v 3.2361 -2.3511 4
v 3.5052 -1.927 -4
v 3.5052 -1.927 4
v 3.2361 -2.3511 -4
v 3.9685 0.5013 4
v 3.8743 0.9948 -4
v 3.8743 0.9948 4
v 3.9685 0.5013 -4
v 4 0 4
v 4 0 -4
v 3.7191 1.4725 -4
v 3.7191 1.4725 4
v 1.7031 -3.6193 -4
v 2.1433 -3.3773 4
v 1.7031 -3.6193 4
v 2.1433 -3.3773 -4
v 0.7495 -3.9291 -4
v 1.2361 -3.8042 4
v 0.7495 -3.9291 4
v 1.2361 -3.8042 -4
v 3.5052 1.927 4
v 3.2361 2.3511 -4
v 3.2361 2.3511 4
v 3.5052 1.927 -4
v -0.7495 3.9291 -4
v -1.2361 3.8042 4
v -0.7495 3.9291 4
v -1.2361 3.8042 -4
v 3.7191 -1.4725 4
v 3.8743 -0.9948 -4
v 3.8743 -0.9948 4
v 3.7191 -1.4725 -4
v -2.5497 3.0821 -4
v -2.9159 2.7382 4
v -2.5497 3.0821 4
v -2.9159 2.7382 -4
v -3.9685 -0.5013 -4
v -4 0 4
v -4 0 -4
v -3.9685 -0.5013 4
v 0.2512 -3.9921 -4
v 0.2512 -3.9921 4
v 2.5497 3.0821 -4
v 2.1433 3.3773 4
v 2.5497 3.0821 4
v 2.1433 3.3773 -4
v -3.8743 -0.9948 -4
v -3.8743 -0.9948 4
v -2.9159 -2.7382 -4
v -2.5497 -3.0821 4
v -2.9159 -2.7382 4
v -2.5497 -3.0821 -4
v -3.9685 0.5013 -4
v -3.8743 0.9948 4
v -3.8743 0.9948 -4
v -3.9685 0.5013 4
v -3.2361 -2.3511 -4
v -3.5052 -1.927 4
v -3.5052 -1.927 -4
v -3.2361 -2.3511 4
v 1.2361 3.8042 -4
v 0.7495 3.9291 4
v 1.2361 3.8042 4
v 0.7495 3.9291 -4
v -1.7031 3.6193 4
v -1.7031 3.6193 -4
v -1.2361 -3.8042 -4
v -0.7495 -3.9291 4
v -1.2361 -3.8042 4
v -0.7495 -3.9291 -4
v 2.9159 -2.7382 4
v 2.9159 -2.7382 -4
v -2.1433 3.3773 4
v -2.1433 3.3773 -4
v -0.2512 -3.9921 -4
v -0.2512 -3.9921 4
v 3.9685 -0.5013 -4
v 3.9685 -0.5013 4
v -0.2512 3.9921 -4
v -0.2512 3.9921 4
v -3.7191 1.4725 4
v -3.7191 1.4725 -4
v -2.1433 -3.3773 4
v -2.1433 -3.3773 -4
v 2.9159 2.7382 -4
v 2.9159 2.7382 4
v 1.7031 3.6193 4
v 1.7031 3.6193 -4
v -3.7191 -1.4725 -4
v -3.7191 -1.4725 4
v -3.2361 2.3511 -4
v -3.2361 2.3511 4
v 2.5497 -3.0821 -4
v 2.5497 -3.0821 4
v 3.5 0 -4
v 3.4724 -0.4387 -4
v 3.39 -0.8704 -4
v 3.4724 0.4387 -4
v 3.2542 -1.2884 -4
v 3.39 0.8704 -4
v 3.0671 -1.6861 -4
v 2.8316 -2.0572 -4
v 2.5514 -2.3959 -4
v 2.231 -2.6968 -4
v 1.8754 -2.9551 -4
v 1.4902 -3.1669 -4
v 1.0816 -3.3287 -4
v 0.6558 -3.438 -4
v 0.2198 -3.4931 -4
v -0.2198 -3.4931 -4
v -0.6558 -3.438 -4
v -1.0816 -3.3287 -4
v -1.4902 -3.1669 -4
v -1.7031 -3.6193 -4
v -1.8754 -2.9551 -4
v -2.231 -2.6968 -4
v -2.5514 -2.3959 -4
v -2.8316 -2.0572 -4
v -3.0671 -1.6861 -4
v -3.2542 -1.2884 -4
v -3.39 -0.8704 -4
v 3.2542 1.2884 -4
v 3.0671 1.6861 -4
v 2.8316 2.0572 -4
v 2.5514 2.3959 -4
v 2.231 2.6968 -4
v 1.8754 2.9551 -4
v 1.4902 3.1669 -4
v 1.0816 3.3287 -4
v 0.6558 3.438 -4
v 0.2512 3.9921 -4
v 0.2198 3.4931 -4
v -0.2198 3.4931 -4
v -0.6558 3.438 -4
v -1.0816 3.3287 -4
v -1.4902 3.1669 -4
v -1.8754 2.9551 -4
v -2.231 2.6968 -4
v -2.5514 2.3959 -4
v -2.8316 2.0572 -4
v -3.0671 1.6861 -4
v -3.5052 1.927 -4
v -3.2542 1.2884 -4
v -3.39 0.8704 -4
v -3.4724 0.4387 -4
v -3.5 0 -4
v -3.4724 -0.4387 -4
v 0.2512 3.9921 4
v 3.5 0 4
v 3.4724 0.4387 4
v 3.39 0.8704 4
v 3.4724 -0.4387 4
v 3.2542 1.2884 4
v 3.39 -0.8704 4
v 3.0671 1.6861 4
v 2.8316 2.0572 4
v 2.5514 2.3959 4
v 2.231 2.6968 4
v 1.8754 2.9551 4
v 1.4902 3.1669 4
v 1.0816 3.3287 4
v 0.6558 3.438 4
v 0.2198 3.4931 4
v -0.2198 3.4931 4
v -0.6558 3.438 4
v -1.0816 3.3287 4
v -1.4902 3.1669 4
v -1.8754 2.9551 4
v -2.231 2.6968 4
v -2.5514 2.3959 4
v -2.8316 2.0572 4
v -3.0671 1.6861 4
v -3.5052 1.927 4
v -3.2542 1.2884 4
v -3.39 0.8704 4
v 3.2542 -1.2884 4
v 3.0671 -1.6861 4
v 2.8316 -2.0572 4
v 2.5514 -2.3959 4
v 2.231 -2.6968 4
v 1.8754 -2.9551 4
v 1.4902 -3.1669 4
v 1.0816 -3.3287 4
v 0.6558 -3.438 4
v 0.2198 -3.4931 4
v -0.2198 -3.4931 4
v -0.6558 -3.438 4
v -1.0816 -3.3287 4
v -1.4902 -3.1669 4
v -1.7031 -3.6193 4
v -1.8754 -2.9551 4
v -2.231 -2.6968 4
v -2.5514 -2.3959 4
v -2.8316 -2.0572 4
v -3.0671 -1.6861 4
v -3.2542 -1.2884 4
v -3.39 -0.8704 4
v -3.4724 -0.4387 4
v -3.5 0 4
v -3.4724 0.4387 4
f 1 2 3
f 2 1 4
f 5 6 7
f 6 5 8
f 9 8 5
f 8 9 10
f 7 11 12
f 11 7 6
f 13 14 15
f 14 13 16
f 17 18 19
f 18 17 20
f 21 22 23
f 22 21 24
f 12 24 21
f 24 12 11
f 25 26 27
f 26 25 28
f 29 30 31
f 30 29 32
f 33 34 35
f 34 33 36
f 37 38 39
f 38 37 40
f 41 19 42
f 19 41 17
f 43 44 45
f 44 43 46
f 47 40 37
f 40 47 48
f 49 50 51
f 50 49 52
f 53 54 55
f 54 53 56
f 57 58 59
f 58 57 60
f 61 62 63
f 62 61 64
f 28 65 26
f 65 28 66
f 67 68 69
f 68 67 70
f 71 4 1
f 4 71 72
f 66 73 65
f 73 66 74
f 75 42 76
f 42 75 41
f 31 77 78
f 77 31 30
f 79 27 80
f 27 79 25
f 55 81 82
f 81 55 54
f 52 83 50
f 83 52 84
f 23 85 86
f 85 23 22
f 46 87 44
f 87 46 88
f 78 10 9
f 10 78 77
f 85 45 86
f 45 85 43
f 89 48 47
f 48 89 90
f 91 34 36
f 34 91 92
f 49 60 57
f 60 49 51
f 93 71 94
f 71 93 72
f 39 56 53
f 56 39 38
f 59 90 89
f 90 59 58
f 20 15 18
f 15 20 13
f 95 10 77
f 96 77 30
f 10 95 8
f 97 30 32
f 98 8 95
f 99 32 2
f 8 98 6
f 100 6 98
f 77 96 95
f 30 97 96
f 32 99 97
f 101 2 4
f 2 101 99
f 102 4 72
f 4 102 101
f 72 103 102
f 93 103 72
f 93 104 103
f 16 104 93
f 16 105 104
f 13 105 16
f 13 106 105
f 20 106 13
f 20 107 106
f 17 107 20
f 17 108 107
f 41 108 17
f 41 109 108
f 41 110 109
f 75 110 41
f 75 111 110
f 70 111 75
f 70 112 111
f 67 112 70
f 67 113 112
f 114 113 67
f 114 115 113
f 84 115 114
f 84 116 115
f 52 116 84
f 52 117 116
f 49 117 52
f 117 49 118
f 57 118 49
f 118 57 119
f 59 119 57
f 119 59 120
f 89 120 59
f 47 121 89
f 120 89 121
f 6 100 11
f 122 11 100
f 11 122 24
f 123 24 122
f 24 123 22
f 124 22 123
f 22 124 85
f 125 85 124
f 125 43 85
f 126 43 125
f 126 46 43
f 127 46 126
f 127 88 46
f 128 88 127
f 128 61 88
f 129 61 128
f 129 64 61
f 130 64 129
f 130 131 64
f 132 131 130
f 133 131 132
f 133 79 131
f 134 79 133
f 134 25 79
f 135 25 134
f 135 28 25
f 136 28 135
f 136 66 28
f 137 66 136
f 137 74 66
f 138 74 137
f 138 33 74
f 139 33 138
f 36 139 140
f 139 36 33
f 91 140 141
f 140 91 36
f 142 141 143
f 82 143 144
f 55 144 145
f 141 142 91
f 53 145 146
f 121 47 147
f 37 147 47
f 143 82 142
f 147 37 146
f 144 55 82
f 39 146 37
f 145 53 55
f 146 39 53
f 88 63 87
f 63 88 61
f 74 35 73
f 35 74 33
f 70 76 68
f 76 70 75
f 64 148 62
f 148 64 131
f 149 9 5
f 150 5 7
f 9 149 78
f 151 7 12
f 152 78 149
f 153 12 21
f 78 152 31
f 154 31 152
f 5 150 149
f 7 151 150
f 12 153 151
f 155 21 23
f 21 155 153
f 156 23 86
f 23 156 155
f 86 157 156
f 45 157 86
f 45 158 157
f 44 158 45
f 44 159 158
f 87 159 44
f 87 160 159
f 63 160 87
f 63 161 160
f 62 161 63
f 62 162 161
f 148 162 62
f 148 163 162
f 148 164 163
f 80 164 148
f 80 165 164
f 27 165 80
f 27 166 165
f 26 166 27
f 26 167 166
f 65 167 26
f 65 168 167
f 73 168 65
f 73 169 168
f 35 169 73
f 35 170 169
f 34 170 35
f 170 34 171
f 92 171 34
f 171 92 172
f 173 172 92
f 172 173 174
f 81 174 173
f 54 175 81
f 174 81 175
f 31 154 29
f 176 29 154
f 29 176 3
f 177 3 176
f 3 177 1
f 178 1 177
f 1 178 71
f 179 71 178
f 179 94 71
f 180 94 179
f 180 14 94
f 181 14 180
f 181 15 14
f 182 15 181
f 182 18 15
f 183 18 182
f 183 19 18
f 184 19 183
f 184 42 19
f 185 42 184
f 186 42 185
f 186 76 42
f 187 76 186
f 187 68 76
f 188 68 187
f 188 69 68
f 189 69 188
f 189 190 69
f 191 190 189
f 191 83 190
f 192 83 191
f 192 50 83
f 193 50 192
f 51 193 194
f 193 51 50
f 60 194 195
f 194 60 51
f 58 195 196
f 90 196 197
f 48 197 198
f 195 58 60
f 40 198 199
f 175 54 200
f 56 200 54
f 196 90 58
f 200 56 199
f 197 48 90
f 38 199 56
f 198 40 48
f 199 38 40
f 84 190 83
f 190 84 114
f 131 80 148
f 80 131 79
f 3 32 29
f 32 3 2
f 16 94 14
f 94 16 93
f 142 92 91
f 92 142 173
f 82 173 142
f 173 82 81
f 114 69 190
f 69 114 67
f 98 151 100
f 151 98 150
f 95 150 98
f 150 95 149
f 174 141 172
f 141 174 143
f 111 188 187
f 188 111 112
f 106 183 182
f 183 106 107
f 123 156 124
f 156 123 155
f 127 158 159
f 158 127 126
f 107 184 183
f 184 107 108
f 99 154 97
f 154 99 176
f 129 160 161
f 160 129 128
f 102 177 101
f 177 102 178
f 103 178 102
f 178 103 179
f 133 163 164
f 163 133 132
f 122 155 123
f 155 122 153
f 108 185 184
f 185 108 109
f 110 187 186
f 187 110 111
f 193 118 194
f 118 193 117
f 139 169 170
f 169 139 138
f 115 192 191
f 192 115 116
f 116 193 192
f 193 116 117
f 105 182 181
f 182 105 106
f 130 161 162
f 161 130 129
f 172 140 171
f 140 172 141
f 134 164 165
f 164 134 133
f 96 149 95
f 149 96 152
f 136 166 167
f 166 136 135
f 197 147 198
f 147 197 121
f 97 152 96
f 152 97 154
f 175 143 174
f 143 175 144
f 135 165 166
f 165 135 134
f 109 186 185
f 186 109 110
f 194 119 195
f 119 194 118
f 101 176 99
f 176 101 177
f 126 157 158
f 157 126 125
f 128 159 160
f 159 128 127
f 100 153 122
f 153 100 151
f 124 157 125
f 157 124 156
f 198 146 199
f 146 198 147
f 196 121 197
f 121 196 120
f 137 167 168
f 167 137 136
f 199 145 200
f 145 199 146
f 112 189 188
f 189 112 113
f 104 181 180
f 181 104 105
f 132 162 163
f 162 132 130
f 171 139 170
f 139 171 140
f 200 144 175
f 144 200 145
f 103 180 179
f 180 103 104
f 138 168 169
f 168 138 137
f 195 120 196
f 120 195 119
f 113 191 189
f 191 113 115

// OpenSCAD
$fn = 50;


difference() {
	union() {
		translate(v = [0, 0, -4.0000000000]) {
			cylinder(h = 8, r = 4.0000000000);
		}
	}
	union() {
		translate(v = [0, 0, -100.0000000000]) {
			cylinder(h = 200, r = 3.5000000000);
		}
	}
}
